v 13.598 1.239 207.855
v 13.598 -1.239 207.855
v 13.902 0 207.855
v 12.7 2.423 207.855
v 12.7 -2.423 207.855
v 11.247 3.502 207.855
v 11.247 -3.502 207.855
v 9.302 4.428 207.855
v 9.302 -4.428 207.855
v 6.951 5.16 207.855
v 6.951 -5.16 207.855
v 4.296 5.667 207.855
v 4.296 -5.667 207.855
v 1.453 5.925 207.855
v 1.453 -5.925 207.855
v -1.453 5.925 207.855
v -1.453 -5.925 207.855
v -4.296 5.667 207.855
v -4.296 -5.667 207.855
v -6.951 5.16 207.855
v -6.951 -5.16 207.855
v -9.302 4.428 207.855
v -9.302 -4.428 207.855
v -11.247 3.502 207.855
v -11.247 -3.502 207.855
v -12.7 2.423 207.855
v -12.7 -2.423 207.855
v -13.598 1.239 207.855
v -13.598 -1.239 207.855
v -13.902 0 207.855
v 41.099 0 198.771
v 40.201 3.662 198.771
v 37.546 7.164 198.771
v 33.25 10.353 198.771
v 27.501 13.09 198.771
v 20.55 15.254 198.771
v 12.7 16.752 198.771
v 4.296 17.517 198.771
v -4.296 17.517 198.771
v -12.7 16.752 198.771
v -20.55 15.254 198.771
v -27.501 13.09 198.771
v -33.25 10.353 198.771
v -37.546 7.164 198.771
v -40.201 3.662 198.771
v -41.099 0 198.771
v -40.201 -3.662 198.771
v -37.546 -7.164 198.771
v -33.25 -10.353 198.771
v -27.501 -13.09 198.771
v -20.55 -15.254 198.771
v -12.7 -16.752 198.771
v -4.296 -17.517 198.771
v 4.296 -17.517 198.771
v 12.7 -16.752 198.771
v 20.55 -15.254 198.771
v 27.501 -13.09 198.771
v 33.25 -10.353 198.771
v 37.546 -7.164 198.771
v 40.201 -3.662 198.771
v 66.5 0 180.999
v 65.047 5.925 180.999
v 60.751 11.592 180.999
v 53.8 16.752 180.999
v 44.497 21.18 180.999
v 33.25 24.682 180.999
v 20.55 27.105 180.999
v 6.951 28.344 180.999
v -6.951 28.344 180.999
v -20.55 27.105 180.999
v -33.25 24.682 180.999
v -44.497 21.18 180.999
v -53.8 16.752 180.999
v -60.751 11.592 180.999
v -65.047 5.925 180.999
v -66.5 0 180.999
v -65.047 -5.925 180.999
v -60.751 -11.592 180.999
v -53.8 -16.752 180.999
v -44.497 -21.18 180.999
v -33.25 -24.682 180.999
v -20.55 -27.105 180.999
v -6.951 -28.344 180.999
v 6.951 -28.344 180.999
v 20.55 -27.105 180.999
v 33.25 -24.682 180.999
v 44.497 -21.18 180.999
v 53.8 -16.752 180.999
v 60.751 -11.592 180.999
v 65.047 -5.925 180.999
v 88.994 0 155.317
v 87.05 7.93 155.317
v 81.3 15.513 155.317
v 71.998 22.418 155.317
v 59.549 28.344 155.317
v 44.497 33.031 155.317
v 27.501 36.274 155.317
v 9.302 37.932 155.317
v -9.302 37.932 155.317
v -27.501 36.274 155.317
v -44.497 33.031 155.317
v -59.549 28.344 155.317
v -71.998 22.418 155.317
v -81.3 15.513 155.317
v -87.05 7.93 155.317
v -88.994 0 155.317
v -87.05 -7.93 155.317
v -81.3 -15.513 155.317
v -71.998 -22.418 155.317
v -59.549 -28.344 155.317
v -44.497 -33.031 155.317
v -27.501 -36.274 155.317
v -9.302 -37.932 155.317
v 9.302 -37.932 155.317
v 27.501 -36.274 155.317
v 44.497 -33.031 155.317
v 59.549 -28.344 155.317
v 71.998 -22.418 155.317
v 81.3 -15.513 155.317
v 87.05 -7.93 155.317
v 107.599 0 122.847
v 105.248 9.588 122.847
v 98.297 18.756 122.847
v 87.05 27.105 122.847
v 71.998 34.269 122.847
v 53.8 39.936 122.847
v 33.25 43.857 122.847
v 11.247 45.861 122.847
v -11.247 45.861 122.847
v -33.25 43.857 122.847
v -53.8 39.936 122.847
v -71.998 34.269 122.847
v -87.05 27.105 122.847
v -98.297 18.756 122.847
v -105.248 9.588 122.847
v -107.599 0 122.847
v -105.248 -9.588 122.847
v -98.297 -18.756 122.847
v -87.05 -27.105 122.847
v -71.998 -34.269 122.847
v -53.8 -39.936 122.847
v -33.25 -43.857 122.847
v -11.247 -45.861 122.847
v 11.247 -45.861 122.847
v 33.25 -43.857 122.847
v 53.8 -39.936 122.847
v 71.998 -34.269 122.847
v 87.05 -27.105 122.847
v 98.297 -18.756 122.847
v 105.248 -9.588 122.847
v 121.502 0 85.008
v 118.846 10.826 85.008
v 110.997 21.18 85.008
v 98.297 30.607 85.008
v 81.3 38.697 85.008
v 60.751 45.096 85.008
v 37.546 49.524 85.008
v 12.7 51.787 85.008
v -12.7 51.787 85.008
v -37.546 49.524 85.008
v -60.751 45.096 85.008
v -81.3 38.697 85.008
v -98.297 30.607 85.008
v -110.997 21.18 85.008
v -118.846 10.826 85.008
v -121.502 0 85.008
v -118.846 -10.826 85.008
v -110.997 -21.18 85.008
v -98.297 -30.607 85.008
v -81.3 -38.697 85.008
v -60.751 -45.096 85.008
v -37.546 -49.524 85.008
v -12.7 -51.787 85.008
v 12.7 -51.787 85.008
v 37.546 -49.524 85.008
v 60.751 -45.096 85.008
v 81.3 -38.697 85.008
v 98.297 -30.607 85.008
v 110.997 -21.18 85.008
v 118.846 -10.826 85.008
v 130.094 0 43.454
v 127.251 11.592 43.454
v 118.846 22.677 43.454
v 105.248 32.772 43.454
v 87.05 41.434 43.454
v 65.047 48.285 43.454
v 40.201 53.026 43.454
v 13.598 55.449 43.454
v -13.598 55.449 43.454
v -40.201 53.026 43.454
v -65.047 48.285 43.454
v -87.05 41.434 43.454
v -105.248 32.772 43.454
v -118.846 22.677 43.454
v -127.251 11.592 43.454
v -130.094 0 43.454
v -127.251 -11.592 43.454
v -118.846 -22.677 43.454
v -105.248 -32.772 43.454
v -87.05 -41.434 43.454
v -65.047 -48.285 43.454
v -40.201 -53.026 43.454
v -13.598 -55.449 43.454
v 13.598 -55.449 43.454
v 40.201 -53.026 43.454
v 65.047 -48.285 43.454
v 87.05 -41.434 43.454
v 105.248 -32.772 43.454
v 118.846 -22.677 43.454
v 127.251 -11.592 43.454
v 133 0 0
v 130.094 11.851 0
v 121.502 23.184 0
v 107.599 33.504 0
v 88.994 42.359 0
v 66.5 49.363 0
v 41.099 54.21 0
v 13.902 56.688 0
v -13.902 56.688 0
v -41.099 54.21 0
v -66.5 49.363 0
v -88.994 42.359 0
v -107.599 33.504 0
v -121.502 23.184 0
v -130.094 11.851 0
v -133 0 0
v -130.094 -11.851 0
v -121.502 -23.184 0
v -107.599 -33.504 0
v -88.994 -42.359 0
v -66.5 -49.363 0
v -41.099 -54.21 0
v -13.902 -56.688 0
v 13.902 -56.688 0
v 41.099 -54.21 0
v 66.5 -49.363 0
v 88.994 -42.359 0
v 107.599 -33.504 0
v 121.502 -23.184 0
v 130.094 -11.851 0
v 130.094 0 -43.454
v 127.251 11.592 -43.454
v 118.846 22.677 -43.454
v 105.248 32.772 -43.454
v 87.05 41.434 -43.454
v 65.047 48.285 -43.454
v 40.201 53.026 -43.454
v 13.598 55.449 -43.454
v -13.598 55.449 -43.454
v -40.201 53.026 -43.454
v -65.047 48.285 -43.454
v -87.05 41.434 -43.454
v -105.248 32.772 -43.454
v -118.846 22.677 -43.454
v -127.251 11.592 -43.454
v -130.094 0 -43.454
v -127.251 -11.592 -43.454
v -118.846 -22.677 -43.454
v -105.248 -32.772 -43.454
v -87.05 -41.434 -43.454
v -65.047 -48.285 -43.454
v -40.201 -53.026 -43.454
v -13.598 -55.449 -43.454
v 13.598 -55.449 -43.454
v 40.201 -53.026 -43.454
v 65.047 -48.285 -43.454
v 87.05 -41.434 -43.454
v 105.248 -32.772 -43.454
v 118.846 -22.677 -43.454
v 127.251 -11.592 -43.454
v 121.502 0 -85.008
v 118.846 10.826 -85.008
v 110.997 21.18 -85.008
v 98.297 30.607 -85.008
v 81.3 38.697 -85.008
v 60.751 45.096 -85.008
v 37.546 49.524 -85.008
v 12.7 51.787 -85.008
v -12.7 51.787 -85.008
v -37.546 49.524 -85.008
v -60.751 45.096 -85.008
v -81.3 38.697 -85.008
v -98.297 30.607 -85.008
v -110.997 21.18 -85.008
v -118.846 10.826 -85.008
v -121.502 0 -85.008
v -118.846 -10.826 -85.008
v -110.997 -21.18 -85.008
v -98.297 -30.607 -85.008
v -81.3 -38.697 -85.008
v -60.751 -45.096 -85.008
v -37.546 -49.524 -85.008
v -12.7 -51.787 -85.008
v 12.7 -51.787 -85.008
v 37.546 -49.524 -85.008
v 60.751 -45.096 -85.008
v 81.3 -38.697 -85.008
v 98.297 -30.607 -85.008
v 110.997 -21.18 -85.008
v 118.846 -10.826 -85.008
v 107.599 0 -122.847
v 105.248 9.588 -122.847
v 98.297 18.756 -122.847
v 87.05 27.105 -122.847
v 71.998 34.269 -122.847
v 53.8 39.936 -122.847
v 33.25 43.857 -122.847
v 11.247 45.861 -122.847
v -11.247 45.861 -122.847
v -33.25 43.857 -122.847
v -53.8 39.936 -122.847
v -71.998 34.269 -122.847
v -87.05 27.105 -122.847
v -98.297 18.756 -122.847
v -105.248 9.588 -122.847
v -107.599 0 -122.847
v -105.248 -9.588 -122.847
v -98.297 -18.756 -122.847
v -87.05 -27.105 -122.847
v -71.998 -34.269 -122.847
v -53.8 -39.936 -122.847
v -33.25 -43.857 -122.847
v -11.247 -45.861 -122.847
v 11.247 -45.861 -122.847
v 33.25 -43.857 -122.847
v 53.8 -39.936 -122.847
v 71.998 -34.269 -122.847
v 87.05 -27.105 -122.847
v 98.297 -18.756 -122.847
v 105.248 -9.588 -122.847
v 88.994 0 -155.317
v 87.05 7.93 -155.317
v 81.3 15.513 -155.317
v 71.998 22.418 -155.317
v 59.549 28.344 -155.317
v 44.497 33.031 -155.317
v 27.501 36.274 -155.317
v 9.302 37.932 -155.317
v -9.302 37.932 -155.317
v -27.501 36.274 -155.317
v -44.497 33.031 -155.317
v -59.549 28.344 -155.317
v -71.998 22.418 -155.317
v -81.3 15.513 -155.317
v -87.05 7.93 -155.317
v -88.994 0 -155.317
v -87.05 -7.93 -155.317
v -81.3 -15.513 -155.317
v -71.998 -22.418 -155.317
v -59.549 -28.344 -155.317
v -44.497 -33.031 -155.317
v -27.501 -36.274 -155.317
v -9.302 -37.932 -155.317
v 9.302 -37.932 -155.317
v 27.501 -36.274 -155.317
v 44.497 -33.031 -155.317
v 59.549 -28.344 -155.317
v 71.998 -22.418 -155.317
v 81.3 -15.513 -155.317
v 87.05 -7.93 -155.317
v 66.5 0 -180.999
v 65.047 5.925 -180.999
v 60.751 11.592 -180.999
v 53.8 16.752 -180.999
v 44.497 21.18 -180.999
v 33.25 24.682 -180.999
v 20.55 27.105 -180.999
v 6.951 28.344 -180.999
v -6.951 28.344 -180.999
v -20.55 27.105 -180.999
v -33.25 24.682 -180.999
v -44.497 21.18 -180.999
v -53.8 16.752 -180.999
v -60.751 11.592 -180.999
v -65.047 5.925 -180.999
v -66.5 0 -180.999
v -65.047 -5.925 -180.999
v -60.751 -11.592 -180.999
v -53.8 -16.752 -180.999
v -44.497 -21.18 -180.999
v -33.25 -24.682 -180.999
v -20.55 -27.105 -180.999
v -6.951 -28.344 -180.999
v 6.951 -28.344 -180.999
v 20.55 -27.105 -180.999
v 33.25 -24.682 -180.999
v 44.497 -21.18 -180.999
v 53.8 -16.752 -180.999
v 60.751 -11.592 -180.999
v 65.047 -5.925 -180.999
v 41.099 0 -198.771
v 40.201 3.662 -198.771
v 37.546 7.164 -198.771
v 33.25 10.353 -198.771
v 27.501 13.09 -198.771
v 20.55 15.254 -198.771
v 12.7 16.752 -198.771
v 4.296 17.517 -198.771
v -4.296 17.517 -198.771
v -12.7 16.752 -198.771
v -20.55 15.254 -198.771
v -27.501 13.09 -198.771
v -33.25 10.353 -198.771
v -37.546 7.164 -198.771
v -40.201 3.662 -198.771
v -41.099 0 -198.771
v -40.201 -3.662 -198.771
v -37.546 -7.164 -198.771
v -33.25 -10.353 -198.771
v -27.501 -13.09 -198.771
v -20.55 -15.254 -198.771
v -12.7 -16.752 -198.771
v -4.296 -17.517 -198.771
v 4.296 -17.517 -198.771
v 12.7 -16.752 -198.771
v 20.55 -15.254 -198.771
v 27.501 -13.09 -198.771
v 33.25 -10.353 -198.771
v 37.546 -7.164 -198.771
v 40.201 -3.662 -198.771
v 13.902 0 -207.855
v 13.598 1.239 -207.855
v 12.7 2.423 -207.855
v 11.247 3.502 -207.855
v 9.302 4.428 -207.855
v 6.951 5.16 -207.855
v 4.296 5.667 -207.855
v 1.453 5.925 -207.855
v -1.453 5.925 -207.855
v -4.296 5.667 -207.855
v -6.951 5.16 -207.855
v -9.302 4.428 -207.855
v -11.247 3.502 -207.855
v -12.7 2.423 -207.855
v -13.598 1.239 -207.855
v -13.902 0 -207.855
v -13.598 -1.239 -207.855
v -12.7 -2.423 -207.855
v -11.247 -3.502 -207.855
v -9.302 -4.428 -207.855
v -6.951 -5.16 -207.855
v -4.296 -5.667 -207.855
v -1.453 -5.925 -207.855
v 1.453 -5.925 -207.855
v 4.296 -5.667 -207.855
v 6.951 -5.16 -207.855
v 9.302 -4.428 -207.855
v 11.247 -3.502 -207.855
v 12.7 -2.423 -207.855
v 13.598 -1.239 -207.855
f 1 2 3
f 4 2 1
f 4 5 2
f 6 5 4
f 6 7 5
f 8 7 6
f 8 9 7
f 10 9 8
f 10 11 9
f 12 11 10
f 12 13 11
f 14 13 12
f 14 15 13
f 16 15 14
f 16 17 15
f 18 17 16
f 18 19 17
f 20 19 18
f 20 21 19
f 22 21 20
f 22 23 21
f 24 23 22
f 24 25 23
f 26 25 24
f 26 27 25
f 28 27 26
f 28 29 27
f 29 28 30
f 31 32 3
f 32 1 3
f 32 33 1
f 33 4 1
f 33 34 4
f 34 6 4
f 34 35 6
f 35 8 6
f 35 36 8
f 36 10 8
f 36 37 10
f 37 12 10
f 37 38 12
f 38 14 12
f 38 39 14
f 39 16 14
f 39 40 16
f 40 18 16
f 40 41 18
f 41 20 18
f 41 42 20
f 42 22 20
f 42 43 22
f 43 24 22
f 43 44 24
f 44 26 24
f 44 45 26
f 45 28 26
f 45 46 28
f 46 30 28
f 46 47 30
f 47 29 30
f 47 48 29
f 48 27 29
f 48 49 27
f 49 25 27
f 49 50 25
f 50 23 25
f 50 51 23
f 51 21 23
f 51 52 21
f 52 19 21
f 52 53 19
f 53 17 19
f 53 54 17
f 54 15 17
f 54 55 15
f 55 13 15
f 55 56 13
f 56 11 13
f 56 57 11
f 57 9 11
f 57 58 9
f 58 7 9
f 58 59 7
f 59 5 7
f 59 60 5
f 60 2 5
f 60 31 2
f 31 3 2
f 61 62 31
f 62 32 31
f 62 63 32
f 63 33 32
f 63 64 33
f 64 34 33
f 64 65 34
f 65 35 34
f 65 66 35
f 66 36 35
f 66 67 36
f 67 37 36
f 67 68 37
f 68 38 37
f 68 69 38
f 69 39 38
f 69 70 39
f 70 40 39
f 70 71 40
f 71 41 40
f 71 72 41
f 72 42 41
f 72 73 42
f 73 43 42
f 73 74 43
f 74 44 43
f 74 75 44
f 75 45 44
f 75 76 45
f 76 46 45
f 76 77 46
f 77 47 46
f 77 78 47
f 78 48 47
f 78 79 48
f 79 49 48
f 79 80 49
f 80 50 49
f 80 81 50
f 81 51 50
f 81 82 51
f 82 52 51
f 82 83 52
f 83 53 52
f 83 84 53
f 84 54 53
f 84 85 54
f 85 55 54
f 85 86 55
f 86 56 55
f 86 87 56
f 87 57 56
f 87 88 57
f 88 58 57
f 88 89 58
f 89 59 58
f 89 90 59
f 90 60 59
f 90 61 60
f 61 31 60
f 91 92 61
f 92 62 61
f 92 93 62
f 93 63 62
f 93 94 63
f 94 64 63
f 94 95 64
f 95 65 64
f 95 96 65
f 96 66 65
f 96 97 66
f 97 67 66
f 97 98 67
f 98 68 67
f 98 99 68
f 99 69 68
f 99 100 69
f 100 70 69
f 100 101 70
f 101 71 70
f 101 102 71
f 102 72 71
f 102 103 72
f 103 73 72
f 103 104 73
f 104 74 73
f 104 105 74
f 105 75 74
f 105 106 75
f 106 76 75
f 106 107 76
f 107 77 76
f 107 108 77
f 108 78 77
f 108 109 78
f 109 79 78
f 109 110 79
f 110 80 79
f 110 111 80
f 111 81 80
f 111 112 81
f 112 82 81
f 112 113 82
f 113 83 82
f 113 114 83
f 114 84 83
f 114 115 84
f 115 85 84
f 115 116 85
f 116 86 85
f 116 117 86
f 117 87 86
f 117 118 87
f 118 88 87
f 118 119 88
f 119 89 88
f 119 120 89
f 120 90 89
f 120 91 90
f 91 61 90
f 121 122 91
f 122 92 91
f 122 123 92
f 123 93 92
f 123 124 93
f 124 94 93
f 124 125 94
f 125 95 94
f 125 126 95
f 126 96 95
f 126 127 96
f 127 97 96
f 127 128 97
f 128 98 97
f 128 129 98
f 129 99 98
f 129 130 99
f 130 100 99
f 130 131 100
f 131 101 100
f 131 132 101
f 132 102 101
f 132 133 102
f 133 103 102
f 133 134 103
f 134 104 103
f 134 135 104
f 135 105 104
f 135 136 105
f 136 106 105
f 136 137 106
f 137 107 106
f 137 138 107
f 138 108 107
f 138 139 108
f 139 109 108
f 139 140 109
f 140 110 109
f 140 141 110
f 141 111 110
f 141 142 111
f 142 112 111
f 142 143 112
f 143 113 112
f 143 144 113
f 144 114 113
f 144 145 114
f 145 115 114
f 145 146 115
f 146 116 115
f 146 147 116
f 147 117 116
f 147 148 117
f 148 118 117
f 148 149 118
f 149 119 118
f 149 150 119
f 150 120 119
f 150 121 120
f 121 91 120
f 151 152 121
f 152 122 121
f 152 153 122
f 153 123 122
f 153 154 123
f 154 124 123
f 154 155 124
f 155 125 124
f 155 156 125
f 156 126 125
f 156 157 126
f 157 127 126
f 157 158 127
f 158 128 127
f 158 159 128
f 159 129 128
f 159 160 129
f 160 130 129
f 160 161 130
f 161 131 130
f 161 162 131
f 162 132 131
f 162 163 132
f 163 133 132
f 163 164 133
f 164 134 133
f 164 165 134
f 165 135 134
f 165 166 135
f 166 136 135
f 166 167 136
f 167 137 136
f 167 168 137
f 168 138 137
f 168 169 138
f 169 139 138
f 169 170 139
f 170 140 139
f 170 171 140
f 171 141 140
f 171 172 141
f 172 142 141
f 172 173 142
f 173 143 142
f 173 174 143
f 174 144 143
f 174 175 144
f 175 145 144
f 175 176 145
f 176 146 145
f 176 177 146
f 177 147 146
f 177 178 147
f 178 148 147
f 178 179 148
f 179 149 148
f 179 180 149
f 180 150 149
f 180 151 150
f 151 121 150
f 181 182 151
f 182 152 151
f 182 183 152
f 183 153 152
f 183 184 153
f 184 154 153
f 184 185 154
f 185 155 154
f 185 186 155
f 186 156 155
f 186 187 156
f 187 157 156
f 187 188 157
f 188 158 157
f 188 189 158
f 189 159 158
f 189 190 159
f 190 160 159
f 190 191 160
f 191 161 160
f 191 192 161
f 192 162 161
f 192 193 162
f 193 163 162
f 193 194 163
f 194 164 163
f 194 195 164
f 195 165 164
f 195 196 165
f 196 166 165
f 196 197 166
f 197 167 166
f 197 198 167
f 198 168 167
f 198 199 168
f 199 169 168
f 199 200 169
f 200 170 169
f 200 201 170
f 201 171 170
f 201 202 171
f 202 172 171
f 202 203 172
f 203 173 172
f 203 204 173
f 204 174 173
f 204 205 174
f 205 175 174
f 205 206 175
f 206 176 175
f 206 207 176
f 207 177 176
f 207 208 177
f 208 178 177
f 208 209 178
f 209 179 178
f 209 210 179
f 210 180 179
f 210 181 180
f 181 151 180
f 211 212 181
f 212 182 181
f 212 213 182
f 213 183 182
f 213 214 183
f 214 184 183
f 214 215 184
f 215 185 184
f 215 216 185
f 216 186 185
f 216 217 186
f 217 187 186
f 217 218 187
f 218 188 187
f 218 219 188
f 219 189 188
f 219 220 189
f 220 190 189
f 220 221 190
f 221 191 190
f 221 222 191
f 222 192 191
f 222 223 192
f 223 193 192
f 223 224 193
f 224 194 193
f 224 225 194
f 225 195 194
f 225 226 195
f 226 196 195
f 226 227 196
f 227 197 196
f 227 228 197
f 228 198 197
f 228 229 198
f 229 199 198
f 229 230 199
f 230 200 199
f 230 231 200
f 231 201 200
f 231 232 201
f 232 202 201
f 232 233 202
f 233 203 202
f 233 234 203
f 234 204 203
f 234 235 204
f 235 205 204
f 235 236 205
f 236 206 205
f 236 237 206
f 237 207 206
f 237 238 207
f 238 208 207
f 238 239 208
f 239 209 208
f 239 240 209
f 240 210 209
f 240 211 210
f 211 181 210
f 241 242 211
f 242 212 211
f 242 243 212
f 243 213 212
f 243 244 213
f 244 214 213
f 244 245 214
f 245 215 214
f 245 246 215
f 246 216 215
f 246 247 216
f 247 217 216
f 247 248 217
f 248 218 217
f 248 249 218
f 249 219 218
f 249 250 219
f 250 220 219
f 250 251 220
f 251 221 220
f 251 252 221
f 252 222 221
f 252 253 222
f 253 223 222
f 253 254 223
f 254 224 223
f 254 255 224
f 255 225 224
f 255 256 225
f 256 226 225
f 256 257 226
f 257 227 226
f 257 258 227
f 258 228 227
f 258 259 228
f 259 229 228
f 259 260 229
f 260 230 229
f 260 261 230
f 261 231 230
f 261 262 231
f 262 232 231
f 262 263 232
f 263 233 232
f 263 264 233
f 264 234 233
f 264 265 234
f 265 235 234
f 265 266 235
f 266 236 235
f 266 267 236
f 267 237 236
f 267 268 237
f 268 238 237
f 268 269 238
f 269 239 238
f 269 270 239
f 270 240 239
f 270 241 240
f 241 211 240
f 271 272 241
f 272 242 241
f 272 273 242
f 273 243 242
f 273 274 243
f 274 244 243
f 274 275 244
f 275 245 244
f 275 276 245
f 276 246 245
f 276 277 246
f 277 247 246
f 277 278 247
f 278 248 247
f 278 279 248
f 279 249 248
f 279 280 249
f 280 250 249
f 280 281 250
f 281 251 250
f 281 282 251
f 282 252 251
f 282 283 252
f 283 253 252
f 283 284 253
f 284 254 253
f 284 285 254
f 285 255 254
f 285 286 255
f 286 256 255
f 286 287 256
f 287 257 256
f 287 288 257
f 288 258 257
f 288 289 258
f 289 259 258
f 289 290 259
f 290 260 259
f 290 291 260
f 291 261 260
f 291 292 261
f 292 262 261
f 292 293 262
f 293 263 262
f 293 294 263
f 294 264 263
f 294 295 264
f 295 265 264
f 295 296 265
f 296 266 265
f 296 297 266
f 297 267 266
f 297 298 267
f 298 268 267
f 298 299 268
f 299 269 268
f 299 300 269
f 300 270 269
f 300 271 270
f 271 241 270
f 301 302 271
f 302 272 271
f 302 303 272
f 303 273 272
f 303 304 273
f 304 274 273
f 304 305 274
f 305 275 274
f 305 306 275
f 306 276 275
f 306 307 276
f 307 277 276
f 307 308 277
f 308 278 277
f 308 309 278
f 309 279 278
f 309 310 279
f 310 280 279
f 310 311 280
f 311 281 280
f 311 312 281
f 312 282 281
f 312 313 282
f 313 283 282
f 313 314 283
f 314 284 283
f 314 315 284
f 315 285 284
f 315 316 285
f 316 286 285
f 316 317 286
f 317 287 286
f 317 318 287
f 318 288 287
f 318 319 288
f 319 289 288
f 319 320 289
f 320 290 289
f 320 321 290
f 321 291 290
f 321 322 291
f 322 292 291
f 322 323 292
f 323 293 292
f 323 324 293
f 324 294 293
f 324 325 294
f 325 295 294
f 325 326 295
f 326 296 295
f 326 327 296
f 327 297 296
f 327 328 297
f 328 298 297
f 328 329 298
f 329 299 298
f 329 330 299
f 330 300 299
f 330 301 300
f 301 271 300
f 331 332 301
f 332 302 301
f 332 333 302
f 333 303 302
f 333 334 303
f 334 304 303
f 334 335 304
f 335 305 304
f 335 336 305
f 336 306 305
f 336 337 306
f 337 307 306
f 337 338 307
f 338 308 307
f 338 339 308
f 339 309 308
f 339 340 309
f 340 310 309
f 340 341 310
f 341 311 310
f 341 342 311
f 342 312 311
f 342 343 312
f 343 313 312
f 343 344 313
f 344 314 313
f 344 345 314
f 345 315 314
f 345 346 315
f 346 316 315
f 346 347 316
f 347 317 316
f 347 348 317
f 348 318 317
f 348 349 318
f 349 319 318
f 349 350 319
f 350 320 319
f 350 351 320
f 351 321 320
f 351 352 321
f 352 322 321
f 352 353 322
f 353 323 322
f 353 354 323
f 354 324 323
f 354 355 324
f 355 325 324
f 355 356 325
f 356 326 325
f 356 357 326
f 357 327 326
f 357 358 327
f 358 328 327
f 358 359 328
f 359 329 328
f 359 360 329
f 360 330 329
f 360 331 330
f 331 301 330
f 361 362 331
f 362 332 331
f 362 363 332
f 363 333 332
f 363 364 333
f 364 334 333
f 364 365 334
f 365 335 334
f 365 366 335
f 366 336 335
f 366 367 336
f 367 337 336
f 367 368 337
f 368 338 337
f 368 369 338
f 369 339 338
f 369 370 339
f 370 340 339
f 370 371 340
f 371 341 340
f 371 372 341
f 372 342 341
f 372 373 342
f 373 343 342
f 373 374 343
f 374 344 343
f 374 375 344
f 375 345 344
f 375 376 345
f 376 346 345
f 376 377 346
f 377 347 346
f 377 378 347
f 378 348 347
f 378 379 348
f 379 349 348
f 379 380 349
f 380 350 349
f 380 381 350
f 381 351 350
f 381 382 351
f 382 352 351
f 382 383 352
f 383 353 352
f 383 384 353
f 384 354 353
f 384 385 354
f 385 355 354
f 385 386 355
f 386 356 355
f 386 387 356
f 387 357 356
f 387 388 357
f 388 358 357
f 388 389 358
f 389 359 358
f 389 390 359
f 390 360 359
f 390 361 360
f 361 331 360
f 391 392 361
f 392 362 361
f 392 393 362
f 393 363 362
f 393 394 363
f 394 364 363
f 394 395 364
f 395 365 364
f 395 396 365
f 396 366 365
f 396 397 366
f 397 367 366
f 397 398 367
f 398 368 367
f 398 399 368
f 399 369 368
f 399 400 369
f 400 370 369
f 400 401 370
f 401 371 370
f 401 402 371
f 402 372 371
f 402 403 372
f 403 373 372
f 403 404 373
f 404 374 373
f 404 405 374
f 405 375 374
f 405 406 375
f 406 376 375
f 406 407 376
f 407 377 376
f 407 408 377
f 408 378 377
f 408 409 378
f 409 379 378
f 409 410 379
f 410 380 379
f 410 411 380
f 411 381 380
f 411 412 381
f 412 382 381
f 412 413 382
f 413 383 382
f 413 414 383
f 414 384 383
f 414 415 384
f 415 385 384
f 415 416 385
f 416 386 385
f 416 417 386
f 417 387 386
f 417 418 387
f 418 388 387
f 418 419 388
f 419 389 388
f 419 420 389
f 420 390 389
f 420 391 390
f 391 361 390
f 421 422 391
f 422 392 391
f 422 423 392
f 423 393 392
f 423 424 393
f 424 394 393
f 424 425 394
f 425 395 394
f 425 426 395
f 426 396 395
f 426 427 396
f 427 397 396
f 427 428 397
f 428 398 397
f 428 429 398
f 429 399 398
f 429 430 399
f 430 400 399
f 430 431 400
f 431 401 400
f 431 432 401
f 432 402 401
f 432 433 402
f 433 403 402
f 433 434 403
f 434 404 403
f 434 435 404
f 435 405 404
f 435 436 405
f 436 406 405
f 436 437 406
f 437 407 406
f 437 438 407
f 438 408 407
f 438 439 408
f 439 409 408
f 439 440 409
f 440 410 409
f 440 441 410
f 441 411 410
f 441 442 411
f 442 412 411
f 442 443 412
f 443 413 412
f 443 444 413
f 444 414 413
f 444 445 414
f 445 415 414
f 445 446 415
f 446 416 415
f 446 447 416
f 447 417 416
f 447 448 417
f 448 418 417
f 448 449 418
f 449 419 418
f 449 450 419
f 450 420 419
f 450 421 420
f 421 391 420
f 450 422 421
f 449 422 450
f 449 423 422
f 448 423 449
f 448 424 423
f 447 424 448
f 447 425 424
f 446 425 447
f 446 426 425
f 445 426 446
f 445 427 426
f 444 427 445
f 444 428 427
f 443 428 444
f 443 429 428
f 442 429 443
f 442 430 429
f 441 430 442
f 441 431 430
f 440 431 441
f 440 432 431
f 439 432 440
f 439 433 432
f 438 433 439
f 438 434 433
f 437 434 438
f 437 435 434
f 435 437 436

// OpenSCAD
// Generated by SolidPython 1.0.1 on 2020-07-29 00:46:47


scale(v = [7, 3, 11]) {
	sphere(r = 19);
}
/***********************************************
*********      SolidPython code:      **********
************************************************
 
# import packages: SolidPython
from solid import *
from solid.utils import *
from itertools import chain, combinations, permutations


class Resize:

    def __init__(self, scad_file):
        self.scad_file = scad_file
        #self.scad_file = import_scad(scad_file)
        # cone/cylinder param:
        self.r1 = 0
        self.r2 = 0
        self.h = 0
        # rectangular prism param:
        self.w = 0
        self.l = 0
        # ellipse param:
        self.r = 0

    # import OpenScad code (file name corresponds to shape)


    # classify shape + parameters
    def assign(self, param1, param2, param3):
        if self.scad_file == 'cone.scad':
            self.r1 = param1
            self.r2 = param2
            self.h = param3
        elif self.scad_file == 'cylinder.scad':
            self.r1 = param1
            self.r2 = param2
            self.h = param3
        elif self.scad_file == 'rectangularPrism.scad':
            self.h = param1
            self.l = param2
            self.w = param3
        else:
            self.r = param1
            self.h = param2

    # resize parameters
    def iterate(self):
        x = range(3, 20, 2)
        i = 1
        if self.scad_file == 'cone.scad':
            tempList = list(permutations(x, 2))
            for temp in tempList:
                param1 = temp[0]
                param2 = temp[1]
                filepath = 'produced_scad_files/' + 'cone' + str(param1) + '_' + str(param2) + '_' + '.scad'
                scad_render_to_file(cylinder(h=param1, r1=param2, r2=0), filepath)

        elif self.scad_file == 'cylinder.scad':
            tempList = list(permutations(x, 3))
            for temp in tempList:
                param1 = temp[0]
                param2 = temp[1]
                filepath = 'produced_scad_files/' + 'cylinder' + str(param1) + '_' + str(param2) + '_' + '.scad'
                scad_render_to_file(cylinder(h=param1, r1=param2, r2=param2), filepath)

        elif self.scad_file == 'rectangularPrism.scad':
            tempList = list(permutations(x, 3))
            for temp in tempList:
                param1 = temp[0]
                param2 = temp[1]
                param3 = temp[2]
                filepath = 'produced_scad_files/' + 'rectangularPrism' + str(param1) + '_' + str(param2) + '_' + str(
                    param3) + '.scad'
                scad_render_to_file(cube(size=(param1, param2, param3)), filepath)

        elif self.scad_file == 'ellipse.scad':
            tempList = list(permutations(x, 4))
            for temp in tempList:
                param1 = temp[0]
                param2 = temp[1]
                param3 = temp[2]
                param4 = temp[3]
                filepath = 'produced_scad_files/' + 'ellipse' + str(param1) + '_' + str(param2) + '_' + str(param3) + '_' + str(param4) + '.scad'
                scad_render_to_file(scale([param1, param2, param3])(sphere(r=param4)), filepath)

    def render_to_scadfile(self):
        scad_render_to_file(scad, 'example.scad') 
 
************************************************/
